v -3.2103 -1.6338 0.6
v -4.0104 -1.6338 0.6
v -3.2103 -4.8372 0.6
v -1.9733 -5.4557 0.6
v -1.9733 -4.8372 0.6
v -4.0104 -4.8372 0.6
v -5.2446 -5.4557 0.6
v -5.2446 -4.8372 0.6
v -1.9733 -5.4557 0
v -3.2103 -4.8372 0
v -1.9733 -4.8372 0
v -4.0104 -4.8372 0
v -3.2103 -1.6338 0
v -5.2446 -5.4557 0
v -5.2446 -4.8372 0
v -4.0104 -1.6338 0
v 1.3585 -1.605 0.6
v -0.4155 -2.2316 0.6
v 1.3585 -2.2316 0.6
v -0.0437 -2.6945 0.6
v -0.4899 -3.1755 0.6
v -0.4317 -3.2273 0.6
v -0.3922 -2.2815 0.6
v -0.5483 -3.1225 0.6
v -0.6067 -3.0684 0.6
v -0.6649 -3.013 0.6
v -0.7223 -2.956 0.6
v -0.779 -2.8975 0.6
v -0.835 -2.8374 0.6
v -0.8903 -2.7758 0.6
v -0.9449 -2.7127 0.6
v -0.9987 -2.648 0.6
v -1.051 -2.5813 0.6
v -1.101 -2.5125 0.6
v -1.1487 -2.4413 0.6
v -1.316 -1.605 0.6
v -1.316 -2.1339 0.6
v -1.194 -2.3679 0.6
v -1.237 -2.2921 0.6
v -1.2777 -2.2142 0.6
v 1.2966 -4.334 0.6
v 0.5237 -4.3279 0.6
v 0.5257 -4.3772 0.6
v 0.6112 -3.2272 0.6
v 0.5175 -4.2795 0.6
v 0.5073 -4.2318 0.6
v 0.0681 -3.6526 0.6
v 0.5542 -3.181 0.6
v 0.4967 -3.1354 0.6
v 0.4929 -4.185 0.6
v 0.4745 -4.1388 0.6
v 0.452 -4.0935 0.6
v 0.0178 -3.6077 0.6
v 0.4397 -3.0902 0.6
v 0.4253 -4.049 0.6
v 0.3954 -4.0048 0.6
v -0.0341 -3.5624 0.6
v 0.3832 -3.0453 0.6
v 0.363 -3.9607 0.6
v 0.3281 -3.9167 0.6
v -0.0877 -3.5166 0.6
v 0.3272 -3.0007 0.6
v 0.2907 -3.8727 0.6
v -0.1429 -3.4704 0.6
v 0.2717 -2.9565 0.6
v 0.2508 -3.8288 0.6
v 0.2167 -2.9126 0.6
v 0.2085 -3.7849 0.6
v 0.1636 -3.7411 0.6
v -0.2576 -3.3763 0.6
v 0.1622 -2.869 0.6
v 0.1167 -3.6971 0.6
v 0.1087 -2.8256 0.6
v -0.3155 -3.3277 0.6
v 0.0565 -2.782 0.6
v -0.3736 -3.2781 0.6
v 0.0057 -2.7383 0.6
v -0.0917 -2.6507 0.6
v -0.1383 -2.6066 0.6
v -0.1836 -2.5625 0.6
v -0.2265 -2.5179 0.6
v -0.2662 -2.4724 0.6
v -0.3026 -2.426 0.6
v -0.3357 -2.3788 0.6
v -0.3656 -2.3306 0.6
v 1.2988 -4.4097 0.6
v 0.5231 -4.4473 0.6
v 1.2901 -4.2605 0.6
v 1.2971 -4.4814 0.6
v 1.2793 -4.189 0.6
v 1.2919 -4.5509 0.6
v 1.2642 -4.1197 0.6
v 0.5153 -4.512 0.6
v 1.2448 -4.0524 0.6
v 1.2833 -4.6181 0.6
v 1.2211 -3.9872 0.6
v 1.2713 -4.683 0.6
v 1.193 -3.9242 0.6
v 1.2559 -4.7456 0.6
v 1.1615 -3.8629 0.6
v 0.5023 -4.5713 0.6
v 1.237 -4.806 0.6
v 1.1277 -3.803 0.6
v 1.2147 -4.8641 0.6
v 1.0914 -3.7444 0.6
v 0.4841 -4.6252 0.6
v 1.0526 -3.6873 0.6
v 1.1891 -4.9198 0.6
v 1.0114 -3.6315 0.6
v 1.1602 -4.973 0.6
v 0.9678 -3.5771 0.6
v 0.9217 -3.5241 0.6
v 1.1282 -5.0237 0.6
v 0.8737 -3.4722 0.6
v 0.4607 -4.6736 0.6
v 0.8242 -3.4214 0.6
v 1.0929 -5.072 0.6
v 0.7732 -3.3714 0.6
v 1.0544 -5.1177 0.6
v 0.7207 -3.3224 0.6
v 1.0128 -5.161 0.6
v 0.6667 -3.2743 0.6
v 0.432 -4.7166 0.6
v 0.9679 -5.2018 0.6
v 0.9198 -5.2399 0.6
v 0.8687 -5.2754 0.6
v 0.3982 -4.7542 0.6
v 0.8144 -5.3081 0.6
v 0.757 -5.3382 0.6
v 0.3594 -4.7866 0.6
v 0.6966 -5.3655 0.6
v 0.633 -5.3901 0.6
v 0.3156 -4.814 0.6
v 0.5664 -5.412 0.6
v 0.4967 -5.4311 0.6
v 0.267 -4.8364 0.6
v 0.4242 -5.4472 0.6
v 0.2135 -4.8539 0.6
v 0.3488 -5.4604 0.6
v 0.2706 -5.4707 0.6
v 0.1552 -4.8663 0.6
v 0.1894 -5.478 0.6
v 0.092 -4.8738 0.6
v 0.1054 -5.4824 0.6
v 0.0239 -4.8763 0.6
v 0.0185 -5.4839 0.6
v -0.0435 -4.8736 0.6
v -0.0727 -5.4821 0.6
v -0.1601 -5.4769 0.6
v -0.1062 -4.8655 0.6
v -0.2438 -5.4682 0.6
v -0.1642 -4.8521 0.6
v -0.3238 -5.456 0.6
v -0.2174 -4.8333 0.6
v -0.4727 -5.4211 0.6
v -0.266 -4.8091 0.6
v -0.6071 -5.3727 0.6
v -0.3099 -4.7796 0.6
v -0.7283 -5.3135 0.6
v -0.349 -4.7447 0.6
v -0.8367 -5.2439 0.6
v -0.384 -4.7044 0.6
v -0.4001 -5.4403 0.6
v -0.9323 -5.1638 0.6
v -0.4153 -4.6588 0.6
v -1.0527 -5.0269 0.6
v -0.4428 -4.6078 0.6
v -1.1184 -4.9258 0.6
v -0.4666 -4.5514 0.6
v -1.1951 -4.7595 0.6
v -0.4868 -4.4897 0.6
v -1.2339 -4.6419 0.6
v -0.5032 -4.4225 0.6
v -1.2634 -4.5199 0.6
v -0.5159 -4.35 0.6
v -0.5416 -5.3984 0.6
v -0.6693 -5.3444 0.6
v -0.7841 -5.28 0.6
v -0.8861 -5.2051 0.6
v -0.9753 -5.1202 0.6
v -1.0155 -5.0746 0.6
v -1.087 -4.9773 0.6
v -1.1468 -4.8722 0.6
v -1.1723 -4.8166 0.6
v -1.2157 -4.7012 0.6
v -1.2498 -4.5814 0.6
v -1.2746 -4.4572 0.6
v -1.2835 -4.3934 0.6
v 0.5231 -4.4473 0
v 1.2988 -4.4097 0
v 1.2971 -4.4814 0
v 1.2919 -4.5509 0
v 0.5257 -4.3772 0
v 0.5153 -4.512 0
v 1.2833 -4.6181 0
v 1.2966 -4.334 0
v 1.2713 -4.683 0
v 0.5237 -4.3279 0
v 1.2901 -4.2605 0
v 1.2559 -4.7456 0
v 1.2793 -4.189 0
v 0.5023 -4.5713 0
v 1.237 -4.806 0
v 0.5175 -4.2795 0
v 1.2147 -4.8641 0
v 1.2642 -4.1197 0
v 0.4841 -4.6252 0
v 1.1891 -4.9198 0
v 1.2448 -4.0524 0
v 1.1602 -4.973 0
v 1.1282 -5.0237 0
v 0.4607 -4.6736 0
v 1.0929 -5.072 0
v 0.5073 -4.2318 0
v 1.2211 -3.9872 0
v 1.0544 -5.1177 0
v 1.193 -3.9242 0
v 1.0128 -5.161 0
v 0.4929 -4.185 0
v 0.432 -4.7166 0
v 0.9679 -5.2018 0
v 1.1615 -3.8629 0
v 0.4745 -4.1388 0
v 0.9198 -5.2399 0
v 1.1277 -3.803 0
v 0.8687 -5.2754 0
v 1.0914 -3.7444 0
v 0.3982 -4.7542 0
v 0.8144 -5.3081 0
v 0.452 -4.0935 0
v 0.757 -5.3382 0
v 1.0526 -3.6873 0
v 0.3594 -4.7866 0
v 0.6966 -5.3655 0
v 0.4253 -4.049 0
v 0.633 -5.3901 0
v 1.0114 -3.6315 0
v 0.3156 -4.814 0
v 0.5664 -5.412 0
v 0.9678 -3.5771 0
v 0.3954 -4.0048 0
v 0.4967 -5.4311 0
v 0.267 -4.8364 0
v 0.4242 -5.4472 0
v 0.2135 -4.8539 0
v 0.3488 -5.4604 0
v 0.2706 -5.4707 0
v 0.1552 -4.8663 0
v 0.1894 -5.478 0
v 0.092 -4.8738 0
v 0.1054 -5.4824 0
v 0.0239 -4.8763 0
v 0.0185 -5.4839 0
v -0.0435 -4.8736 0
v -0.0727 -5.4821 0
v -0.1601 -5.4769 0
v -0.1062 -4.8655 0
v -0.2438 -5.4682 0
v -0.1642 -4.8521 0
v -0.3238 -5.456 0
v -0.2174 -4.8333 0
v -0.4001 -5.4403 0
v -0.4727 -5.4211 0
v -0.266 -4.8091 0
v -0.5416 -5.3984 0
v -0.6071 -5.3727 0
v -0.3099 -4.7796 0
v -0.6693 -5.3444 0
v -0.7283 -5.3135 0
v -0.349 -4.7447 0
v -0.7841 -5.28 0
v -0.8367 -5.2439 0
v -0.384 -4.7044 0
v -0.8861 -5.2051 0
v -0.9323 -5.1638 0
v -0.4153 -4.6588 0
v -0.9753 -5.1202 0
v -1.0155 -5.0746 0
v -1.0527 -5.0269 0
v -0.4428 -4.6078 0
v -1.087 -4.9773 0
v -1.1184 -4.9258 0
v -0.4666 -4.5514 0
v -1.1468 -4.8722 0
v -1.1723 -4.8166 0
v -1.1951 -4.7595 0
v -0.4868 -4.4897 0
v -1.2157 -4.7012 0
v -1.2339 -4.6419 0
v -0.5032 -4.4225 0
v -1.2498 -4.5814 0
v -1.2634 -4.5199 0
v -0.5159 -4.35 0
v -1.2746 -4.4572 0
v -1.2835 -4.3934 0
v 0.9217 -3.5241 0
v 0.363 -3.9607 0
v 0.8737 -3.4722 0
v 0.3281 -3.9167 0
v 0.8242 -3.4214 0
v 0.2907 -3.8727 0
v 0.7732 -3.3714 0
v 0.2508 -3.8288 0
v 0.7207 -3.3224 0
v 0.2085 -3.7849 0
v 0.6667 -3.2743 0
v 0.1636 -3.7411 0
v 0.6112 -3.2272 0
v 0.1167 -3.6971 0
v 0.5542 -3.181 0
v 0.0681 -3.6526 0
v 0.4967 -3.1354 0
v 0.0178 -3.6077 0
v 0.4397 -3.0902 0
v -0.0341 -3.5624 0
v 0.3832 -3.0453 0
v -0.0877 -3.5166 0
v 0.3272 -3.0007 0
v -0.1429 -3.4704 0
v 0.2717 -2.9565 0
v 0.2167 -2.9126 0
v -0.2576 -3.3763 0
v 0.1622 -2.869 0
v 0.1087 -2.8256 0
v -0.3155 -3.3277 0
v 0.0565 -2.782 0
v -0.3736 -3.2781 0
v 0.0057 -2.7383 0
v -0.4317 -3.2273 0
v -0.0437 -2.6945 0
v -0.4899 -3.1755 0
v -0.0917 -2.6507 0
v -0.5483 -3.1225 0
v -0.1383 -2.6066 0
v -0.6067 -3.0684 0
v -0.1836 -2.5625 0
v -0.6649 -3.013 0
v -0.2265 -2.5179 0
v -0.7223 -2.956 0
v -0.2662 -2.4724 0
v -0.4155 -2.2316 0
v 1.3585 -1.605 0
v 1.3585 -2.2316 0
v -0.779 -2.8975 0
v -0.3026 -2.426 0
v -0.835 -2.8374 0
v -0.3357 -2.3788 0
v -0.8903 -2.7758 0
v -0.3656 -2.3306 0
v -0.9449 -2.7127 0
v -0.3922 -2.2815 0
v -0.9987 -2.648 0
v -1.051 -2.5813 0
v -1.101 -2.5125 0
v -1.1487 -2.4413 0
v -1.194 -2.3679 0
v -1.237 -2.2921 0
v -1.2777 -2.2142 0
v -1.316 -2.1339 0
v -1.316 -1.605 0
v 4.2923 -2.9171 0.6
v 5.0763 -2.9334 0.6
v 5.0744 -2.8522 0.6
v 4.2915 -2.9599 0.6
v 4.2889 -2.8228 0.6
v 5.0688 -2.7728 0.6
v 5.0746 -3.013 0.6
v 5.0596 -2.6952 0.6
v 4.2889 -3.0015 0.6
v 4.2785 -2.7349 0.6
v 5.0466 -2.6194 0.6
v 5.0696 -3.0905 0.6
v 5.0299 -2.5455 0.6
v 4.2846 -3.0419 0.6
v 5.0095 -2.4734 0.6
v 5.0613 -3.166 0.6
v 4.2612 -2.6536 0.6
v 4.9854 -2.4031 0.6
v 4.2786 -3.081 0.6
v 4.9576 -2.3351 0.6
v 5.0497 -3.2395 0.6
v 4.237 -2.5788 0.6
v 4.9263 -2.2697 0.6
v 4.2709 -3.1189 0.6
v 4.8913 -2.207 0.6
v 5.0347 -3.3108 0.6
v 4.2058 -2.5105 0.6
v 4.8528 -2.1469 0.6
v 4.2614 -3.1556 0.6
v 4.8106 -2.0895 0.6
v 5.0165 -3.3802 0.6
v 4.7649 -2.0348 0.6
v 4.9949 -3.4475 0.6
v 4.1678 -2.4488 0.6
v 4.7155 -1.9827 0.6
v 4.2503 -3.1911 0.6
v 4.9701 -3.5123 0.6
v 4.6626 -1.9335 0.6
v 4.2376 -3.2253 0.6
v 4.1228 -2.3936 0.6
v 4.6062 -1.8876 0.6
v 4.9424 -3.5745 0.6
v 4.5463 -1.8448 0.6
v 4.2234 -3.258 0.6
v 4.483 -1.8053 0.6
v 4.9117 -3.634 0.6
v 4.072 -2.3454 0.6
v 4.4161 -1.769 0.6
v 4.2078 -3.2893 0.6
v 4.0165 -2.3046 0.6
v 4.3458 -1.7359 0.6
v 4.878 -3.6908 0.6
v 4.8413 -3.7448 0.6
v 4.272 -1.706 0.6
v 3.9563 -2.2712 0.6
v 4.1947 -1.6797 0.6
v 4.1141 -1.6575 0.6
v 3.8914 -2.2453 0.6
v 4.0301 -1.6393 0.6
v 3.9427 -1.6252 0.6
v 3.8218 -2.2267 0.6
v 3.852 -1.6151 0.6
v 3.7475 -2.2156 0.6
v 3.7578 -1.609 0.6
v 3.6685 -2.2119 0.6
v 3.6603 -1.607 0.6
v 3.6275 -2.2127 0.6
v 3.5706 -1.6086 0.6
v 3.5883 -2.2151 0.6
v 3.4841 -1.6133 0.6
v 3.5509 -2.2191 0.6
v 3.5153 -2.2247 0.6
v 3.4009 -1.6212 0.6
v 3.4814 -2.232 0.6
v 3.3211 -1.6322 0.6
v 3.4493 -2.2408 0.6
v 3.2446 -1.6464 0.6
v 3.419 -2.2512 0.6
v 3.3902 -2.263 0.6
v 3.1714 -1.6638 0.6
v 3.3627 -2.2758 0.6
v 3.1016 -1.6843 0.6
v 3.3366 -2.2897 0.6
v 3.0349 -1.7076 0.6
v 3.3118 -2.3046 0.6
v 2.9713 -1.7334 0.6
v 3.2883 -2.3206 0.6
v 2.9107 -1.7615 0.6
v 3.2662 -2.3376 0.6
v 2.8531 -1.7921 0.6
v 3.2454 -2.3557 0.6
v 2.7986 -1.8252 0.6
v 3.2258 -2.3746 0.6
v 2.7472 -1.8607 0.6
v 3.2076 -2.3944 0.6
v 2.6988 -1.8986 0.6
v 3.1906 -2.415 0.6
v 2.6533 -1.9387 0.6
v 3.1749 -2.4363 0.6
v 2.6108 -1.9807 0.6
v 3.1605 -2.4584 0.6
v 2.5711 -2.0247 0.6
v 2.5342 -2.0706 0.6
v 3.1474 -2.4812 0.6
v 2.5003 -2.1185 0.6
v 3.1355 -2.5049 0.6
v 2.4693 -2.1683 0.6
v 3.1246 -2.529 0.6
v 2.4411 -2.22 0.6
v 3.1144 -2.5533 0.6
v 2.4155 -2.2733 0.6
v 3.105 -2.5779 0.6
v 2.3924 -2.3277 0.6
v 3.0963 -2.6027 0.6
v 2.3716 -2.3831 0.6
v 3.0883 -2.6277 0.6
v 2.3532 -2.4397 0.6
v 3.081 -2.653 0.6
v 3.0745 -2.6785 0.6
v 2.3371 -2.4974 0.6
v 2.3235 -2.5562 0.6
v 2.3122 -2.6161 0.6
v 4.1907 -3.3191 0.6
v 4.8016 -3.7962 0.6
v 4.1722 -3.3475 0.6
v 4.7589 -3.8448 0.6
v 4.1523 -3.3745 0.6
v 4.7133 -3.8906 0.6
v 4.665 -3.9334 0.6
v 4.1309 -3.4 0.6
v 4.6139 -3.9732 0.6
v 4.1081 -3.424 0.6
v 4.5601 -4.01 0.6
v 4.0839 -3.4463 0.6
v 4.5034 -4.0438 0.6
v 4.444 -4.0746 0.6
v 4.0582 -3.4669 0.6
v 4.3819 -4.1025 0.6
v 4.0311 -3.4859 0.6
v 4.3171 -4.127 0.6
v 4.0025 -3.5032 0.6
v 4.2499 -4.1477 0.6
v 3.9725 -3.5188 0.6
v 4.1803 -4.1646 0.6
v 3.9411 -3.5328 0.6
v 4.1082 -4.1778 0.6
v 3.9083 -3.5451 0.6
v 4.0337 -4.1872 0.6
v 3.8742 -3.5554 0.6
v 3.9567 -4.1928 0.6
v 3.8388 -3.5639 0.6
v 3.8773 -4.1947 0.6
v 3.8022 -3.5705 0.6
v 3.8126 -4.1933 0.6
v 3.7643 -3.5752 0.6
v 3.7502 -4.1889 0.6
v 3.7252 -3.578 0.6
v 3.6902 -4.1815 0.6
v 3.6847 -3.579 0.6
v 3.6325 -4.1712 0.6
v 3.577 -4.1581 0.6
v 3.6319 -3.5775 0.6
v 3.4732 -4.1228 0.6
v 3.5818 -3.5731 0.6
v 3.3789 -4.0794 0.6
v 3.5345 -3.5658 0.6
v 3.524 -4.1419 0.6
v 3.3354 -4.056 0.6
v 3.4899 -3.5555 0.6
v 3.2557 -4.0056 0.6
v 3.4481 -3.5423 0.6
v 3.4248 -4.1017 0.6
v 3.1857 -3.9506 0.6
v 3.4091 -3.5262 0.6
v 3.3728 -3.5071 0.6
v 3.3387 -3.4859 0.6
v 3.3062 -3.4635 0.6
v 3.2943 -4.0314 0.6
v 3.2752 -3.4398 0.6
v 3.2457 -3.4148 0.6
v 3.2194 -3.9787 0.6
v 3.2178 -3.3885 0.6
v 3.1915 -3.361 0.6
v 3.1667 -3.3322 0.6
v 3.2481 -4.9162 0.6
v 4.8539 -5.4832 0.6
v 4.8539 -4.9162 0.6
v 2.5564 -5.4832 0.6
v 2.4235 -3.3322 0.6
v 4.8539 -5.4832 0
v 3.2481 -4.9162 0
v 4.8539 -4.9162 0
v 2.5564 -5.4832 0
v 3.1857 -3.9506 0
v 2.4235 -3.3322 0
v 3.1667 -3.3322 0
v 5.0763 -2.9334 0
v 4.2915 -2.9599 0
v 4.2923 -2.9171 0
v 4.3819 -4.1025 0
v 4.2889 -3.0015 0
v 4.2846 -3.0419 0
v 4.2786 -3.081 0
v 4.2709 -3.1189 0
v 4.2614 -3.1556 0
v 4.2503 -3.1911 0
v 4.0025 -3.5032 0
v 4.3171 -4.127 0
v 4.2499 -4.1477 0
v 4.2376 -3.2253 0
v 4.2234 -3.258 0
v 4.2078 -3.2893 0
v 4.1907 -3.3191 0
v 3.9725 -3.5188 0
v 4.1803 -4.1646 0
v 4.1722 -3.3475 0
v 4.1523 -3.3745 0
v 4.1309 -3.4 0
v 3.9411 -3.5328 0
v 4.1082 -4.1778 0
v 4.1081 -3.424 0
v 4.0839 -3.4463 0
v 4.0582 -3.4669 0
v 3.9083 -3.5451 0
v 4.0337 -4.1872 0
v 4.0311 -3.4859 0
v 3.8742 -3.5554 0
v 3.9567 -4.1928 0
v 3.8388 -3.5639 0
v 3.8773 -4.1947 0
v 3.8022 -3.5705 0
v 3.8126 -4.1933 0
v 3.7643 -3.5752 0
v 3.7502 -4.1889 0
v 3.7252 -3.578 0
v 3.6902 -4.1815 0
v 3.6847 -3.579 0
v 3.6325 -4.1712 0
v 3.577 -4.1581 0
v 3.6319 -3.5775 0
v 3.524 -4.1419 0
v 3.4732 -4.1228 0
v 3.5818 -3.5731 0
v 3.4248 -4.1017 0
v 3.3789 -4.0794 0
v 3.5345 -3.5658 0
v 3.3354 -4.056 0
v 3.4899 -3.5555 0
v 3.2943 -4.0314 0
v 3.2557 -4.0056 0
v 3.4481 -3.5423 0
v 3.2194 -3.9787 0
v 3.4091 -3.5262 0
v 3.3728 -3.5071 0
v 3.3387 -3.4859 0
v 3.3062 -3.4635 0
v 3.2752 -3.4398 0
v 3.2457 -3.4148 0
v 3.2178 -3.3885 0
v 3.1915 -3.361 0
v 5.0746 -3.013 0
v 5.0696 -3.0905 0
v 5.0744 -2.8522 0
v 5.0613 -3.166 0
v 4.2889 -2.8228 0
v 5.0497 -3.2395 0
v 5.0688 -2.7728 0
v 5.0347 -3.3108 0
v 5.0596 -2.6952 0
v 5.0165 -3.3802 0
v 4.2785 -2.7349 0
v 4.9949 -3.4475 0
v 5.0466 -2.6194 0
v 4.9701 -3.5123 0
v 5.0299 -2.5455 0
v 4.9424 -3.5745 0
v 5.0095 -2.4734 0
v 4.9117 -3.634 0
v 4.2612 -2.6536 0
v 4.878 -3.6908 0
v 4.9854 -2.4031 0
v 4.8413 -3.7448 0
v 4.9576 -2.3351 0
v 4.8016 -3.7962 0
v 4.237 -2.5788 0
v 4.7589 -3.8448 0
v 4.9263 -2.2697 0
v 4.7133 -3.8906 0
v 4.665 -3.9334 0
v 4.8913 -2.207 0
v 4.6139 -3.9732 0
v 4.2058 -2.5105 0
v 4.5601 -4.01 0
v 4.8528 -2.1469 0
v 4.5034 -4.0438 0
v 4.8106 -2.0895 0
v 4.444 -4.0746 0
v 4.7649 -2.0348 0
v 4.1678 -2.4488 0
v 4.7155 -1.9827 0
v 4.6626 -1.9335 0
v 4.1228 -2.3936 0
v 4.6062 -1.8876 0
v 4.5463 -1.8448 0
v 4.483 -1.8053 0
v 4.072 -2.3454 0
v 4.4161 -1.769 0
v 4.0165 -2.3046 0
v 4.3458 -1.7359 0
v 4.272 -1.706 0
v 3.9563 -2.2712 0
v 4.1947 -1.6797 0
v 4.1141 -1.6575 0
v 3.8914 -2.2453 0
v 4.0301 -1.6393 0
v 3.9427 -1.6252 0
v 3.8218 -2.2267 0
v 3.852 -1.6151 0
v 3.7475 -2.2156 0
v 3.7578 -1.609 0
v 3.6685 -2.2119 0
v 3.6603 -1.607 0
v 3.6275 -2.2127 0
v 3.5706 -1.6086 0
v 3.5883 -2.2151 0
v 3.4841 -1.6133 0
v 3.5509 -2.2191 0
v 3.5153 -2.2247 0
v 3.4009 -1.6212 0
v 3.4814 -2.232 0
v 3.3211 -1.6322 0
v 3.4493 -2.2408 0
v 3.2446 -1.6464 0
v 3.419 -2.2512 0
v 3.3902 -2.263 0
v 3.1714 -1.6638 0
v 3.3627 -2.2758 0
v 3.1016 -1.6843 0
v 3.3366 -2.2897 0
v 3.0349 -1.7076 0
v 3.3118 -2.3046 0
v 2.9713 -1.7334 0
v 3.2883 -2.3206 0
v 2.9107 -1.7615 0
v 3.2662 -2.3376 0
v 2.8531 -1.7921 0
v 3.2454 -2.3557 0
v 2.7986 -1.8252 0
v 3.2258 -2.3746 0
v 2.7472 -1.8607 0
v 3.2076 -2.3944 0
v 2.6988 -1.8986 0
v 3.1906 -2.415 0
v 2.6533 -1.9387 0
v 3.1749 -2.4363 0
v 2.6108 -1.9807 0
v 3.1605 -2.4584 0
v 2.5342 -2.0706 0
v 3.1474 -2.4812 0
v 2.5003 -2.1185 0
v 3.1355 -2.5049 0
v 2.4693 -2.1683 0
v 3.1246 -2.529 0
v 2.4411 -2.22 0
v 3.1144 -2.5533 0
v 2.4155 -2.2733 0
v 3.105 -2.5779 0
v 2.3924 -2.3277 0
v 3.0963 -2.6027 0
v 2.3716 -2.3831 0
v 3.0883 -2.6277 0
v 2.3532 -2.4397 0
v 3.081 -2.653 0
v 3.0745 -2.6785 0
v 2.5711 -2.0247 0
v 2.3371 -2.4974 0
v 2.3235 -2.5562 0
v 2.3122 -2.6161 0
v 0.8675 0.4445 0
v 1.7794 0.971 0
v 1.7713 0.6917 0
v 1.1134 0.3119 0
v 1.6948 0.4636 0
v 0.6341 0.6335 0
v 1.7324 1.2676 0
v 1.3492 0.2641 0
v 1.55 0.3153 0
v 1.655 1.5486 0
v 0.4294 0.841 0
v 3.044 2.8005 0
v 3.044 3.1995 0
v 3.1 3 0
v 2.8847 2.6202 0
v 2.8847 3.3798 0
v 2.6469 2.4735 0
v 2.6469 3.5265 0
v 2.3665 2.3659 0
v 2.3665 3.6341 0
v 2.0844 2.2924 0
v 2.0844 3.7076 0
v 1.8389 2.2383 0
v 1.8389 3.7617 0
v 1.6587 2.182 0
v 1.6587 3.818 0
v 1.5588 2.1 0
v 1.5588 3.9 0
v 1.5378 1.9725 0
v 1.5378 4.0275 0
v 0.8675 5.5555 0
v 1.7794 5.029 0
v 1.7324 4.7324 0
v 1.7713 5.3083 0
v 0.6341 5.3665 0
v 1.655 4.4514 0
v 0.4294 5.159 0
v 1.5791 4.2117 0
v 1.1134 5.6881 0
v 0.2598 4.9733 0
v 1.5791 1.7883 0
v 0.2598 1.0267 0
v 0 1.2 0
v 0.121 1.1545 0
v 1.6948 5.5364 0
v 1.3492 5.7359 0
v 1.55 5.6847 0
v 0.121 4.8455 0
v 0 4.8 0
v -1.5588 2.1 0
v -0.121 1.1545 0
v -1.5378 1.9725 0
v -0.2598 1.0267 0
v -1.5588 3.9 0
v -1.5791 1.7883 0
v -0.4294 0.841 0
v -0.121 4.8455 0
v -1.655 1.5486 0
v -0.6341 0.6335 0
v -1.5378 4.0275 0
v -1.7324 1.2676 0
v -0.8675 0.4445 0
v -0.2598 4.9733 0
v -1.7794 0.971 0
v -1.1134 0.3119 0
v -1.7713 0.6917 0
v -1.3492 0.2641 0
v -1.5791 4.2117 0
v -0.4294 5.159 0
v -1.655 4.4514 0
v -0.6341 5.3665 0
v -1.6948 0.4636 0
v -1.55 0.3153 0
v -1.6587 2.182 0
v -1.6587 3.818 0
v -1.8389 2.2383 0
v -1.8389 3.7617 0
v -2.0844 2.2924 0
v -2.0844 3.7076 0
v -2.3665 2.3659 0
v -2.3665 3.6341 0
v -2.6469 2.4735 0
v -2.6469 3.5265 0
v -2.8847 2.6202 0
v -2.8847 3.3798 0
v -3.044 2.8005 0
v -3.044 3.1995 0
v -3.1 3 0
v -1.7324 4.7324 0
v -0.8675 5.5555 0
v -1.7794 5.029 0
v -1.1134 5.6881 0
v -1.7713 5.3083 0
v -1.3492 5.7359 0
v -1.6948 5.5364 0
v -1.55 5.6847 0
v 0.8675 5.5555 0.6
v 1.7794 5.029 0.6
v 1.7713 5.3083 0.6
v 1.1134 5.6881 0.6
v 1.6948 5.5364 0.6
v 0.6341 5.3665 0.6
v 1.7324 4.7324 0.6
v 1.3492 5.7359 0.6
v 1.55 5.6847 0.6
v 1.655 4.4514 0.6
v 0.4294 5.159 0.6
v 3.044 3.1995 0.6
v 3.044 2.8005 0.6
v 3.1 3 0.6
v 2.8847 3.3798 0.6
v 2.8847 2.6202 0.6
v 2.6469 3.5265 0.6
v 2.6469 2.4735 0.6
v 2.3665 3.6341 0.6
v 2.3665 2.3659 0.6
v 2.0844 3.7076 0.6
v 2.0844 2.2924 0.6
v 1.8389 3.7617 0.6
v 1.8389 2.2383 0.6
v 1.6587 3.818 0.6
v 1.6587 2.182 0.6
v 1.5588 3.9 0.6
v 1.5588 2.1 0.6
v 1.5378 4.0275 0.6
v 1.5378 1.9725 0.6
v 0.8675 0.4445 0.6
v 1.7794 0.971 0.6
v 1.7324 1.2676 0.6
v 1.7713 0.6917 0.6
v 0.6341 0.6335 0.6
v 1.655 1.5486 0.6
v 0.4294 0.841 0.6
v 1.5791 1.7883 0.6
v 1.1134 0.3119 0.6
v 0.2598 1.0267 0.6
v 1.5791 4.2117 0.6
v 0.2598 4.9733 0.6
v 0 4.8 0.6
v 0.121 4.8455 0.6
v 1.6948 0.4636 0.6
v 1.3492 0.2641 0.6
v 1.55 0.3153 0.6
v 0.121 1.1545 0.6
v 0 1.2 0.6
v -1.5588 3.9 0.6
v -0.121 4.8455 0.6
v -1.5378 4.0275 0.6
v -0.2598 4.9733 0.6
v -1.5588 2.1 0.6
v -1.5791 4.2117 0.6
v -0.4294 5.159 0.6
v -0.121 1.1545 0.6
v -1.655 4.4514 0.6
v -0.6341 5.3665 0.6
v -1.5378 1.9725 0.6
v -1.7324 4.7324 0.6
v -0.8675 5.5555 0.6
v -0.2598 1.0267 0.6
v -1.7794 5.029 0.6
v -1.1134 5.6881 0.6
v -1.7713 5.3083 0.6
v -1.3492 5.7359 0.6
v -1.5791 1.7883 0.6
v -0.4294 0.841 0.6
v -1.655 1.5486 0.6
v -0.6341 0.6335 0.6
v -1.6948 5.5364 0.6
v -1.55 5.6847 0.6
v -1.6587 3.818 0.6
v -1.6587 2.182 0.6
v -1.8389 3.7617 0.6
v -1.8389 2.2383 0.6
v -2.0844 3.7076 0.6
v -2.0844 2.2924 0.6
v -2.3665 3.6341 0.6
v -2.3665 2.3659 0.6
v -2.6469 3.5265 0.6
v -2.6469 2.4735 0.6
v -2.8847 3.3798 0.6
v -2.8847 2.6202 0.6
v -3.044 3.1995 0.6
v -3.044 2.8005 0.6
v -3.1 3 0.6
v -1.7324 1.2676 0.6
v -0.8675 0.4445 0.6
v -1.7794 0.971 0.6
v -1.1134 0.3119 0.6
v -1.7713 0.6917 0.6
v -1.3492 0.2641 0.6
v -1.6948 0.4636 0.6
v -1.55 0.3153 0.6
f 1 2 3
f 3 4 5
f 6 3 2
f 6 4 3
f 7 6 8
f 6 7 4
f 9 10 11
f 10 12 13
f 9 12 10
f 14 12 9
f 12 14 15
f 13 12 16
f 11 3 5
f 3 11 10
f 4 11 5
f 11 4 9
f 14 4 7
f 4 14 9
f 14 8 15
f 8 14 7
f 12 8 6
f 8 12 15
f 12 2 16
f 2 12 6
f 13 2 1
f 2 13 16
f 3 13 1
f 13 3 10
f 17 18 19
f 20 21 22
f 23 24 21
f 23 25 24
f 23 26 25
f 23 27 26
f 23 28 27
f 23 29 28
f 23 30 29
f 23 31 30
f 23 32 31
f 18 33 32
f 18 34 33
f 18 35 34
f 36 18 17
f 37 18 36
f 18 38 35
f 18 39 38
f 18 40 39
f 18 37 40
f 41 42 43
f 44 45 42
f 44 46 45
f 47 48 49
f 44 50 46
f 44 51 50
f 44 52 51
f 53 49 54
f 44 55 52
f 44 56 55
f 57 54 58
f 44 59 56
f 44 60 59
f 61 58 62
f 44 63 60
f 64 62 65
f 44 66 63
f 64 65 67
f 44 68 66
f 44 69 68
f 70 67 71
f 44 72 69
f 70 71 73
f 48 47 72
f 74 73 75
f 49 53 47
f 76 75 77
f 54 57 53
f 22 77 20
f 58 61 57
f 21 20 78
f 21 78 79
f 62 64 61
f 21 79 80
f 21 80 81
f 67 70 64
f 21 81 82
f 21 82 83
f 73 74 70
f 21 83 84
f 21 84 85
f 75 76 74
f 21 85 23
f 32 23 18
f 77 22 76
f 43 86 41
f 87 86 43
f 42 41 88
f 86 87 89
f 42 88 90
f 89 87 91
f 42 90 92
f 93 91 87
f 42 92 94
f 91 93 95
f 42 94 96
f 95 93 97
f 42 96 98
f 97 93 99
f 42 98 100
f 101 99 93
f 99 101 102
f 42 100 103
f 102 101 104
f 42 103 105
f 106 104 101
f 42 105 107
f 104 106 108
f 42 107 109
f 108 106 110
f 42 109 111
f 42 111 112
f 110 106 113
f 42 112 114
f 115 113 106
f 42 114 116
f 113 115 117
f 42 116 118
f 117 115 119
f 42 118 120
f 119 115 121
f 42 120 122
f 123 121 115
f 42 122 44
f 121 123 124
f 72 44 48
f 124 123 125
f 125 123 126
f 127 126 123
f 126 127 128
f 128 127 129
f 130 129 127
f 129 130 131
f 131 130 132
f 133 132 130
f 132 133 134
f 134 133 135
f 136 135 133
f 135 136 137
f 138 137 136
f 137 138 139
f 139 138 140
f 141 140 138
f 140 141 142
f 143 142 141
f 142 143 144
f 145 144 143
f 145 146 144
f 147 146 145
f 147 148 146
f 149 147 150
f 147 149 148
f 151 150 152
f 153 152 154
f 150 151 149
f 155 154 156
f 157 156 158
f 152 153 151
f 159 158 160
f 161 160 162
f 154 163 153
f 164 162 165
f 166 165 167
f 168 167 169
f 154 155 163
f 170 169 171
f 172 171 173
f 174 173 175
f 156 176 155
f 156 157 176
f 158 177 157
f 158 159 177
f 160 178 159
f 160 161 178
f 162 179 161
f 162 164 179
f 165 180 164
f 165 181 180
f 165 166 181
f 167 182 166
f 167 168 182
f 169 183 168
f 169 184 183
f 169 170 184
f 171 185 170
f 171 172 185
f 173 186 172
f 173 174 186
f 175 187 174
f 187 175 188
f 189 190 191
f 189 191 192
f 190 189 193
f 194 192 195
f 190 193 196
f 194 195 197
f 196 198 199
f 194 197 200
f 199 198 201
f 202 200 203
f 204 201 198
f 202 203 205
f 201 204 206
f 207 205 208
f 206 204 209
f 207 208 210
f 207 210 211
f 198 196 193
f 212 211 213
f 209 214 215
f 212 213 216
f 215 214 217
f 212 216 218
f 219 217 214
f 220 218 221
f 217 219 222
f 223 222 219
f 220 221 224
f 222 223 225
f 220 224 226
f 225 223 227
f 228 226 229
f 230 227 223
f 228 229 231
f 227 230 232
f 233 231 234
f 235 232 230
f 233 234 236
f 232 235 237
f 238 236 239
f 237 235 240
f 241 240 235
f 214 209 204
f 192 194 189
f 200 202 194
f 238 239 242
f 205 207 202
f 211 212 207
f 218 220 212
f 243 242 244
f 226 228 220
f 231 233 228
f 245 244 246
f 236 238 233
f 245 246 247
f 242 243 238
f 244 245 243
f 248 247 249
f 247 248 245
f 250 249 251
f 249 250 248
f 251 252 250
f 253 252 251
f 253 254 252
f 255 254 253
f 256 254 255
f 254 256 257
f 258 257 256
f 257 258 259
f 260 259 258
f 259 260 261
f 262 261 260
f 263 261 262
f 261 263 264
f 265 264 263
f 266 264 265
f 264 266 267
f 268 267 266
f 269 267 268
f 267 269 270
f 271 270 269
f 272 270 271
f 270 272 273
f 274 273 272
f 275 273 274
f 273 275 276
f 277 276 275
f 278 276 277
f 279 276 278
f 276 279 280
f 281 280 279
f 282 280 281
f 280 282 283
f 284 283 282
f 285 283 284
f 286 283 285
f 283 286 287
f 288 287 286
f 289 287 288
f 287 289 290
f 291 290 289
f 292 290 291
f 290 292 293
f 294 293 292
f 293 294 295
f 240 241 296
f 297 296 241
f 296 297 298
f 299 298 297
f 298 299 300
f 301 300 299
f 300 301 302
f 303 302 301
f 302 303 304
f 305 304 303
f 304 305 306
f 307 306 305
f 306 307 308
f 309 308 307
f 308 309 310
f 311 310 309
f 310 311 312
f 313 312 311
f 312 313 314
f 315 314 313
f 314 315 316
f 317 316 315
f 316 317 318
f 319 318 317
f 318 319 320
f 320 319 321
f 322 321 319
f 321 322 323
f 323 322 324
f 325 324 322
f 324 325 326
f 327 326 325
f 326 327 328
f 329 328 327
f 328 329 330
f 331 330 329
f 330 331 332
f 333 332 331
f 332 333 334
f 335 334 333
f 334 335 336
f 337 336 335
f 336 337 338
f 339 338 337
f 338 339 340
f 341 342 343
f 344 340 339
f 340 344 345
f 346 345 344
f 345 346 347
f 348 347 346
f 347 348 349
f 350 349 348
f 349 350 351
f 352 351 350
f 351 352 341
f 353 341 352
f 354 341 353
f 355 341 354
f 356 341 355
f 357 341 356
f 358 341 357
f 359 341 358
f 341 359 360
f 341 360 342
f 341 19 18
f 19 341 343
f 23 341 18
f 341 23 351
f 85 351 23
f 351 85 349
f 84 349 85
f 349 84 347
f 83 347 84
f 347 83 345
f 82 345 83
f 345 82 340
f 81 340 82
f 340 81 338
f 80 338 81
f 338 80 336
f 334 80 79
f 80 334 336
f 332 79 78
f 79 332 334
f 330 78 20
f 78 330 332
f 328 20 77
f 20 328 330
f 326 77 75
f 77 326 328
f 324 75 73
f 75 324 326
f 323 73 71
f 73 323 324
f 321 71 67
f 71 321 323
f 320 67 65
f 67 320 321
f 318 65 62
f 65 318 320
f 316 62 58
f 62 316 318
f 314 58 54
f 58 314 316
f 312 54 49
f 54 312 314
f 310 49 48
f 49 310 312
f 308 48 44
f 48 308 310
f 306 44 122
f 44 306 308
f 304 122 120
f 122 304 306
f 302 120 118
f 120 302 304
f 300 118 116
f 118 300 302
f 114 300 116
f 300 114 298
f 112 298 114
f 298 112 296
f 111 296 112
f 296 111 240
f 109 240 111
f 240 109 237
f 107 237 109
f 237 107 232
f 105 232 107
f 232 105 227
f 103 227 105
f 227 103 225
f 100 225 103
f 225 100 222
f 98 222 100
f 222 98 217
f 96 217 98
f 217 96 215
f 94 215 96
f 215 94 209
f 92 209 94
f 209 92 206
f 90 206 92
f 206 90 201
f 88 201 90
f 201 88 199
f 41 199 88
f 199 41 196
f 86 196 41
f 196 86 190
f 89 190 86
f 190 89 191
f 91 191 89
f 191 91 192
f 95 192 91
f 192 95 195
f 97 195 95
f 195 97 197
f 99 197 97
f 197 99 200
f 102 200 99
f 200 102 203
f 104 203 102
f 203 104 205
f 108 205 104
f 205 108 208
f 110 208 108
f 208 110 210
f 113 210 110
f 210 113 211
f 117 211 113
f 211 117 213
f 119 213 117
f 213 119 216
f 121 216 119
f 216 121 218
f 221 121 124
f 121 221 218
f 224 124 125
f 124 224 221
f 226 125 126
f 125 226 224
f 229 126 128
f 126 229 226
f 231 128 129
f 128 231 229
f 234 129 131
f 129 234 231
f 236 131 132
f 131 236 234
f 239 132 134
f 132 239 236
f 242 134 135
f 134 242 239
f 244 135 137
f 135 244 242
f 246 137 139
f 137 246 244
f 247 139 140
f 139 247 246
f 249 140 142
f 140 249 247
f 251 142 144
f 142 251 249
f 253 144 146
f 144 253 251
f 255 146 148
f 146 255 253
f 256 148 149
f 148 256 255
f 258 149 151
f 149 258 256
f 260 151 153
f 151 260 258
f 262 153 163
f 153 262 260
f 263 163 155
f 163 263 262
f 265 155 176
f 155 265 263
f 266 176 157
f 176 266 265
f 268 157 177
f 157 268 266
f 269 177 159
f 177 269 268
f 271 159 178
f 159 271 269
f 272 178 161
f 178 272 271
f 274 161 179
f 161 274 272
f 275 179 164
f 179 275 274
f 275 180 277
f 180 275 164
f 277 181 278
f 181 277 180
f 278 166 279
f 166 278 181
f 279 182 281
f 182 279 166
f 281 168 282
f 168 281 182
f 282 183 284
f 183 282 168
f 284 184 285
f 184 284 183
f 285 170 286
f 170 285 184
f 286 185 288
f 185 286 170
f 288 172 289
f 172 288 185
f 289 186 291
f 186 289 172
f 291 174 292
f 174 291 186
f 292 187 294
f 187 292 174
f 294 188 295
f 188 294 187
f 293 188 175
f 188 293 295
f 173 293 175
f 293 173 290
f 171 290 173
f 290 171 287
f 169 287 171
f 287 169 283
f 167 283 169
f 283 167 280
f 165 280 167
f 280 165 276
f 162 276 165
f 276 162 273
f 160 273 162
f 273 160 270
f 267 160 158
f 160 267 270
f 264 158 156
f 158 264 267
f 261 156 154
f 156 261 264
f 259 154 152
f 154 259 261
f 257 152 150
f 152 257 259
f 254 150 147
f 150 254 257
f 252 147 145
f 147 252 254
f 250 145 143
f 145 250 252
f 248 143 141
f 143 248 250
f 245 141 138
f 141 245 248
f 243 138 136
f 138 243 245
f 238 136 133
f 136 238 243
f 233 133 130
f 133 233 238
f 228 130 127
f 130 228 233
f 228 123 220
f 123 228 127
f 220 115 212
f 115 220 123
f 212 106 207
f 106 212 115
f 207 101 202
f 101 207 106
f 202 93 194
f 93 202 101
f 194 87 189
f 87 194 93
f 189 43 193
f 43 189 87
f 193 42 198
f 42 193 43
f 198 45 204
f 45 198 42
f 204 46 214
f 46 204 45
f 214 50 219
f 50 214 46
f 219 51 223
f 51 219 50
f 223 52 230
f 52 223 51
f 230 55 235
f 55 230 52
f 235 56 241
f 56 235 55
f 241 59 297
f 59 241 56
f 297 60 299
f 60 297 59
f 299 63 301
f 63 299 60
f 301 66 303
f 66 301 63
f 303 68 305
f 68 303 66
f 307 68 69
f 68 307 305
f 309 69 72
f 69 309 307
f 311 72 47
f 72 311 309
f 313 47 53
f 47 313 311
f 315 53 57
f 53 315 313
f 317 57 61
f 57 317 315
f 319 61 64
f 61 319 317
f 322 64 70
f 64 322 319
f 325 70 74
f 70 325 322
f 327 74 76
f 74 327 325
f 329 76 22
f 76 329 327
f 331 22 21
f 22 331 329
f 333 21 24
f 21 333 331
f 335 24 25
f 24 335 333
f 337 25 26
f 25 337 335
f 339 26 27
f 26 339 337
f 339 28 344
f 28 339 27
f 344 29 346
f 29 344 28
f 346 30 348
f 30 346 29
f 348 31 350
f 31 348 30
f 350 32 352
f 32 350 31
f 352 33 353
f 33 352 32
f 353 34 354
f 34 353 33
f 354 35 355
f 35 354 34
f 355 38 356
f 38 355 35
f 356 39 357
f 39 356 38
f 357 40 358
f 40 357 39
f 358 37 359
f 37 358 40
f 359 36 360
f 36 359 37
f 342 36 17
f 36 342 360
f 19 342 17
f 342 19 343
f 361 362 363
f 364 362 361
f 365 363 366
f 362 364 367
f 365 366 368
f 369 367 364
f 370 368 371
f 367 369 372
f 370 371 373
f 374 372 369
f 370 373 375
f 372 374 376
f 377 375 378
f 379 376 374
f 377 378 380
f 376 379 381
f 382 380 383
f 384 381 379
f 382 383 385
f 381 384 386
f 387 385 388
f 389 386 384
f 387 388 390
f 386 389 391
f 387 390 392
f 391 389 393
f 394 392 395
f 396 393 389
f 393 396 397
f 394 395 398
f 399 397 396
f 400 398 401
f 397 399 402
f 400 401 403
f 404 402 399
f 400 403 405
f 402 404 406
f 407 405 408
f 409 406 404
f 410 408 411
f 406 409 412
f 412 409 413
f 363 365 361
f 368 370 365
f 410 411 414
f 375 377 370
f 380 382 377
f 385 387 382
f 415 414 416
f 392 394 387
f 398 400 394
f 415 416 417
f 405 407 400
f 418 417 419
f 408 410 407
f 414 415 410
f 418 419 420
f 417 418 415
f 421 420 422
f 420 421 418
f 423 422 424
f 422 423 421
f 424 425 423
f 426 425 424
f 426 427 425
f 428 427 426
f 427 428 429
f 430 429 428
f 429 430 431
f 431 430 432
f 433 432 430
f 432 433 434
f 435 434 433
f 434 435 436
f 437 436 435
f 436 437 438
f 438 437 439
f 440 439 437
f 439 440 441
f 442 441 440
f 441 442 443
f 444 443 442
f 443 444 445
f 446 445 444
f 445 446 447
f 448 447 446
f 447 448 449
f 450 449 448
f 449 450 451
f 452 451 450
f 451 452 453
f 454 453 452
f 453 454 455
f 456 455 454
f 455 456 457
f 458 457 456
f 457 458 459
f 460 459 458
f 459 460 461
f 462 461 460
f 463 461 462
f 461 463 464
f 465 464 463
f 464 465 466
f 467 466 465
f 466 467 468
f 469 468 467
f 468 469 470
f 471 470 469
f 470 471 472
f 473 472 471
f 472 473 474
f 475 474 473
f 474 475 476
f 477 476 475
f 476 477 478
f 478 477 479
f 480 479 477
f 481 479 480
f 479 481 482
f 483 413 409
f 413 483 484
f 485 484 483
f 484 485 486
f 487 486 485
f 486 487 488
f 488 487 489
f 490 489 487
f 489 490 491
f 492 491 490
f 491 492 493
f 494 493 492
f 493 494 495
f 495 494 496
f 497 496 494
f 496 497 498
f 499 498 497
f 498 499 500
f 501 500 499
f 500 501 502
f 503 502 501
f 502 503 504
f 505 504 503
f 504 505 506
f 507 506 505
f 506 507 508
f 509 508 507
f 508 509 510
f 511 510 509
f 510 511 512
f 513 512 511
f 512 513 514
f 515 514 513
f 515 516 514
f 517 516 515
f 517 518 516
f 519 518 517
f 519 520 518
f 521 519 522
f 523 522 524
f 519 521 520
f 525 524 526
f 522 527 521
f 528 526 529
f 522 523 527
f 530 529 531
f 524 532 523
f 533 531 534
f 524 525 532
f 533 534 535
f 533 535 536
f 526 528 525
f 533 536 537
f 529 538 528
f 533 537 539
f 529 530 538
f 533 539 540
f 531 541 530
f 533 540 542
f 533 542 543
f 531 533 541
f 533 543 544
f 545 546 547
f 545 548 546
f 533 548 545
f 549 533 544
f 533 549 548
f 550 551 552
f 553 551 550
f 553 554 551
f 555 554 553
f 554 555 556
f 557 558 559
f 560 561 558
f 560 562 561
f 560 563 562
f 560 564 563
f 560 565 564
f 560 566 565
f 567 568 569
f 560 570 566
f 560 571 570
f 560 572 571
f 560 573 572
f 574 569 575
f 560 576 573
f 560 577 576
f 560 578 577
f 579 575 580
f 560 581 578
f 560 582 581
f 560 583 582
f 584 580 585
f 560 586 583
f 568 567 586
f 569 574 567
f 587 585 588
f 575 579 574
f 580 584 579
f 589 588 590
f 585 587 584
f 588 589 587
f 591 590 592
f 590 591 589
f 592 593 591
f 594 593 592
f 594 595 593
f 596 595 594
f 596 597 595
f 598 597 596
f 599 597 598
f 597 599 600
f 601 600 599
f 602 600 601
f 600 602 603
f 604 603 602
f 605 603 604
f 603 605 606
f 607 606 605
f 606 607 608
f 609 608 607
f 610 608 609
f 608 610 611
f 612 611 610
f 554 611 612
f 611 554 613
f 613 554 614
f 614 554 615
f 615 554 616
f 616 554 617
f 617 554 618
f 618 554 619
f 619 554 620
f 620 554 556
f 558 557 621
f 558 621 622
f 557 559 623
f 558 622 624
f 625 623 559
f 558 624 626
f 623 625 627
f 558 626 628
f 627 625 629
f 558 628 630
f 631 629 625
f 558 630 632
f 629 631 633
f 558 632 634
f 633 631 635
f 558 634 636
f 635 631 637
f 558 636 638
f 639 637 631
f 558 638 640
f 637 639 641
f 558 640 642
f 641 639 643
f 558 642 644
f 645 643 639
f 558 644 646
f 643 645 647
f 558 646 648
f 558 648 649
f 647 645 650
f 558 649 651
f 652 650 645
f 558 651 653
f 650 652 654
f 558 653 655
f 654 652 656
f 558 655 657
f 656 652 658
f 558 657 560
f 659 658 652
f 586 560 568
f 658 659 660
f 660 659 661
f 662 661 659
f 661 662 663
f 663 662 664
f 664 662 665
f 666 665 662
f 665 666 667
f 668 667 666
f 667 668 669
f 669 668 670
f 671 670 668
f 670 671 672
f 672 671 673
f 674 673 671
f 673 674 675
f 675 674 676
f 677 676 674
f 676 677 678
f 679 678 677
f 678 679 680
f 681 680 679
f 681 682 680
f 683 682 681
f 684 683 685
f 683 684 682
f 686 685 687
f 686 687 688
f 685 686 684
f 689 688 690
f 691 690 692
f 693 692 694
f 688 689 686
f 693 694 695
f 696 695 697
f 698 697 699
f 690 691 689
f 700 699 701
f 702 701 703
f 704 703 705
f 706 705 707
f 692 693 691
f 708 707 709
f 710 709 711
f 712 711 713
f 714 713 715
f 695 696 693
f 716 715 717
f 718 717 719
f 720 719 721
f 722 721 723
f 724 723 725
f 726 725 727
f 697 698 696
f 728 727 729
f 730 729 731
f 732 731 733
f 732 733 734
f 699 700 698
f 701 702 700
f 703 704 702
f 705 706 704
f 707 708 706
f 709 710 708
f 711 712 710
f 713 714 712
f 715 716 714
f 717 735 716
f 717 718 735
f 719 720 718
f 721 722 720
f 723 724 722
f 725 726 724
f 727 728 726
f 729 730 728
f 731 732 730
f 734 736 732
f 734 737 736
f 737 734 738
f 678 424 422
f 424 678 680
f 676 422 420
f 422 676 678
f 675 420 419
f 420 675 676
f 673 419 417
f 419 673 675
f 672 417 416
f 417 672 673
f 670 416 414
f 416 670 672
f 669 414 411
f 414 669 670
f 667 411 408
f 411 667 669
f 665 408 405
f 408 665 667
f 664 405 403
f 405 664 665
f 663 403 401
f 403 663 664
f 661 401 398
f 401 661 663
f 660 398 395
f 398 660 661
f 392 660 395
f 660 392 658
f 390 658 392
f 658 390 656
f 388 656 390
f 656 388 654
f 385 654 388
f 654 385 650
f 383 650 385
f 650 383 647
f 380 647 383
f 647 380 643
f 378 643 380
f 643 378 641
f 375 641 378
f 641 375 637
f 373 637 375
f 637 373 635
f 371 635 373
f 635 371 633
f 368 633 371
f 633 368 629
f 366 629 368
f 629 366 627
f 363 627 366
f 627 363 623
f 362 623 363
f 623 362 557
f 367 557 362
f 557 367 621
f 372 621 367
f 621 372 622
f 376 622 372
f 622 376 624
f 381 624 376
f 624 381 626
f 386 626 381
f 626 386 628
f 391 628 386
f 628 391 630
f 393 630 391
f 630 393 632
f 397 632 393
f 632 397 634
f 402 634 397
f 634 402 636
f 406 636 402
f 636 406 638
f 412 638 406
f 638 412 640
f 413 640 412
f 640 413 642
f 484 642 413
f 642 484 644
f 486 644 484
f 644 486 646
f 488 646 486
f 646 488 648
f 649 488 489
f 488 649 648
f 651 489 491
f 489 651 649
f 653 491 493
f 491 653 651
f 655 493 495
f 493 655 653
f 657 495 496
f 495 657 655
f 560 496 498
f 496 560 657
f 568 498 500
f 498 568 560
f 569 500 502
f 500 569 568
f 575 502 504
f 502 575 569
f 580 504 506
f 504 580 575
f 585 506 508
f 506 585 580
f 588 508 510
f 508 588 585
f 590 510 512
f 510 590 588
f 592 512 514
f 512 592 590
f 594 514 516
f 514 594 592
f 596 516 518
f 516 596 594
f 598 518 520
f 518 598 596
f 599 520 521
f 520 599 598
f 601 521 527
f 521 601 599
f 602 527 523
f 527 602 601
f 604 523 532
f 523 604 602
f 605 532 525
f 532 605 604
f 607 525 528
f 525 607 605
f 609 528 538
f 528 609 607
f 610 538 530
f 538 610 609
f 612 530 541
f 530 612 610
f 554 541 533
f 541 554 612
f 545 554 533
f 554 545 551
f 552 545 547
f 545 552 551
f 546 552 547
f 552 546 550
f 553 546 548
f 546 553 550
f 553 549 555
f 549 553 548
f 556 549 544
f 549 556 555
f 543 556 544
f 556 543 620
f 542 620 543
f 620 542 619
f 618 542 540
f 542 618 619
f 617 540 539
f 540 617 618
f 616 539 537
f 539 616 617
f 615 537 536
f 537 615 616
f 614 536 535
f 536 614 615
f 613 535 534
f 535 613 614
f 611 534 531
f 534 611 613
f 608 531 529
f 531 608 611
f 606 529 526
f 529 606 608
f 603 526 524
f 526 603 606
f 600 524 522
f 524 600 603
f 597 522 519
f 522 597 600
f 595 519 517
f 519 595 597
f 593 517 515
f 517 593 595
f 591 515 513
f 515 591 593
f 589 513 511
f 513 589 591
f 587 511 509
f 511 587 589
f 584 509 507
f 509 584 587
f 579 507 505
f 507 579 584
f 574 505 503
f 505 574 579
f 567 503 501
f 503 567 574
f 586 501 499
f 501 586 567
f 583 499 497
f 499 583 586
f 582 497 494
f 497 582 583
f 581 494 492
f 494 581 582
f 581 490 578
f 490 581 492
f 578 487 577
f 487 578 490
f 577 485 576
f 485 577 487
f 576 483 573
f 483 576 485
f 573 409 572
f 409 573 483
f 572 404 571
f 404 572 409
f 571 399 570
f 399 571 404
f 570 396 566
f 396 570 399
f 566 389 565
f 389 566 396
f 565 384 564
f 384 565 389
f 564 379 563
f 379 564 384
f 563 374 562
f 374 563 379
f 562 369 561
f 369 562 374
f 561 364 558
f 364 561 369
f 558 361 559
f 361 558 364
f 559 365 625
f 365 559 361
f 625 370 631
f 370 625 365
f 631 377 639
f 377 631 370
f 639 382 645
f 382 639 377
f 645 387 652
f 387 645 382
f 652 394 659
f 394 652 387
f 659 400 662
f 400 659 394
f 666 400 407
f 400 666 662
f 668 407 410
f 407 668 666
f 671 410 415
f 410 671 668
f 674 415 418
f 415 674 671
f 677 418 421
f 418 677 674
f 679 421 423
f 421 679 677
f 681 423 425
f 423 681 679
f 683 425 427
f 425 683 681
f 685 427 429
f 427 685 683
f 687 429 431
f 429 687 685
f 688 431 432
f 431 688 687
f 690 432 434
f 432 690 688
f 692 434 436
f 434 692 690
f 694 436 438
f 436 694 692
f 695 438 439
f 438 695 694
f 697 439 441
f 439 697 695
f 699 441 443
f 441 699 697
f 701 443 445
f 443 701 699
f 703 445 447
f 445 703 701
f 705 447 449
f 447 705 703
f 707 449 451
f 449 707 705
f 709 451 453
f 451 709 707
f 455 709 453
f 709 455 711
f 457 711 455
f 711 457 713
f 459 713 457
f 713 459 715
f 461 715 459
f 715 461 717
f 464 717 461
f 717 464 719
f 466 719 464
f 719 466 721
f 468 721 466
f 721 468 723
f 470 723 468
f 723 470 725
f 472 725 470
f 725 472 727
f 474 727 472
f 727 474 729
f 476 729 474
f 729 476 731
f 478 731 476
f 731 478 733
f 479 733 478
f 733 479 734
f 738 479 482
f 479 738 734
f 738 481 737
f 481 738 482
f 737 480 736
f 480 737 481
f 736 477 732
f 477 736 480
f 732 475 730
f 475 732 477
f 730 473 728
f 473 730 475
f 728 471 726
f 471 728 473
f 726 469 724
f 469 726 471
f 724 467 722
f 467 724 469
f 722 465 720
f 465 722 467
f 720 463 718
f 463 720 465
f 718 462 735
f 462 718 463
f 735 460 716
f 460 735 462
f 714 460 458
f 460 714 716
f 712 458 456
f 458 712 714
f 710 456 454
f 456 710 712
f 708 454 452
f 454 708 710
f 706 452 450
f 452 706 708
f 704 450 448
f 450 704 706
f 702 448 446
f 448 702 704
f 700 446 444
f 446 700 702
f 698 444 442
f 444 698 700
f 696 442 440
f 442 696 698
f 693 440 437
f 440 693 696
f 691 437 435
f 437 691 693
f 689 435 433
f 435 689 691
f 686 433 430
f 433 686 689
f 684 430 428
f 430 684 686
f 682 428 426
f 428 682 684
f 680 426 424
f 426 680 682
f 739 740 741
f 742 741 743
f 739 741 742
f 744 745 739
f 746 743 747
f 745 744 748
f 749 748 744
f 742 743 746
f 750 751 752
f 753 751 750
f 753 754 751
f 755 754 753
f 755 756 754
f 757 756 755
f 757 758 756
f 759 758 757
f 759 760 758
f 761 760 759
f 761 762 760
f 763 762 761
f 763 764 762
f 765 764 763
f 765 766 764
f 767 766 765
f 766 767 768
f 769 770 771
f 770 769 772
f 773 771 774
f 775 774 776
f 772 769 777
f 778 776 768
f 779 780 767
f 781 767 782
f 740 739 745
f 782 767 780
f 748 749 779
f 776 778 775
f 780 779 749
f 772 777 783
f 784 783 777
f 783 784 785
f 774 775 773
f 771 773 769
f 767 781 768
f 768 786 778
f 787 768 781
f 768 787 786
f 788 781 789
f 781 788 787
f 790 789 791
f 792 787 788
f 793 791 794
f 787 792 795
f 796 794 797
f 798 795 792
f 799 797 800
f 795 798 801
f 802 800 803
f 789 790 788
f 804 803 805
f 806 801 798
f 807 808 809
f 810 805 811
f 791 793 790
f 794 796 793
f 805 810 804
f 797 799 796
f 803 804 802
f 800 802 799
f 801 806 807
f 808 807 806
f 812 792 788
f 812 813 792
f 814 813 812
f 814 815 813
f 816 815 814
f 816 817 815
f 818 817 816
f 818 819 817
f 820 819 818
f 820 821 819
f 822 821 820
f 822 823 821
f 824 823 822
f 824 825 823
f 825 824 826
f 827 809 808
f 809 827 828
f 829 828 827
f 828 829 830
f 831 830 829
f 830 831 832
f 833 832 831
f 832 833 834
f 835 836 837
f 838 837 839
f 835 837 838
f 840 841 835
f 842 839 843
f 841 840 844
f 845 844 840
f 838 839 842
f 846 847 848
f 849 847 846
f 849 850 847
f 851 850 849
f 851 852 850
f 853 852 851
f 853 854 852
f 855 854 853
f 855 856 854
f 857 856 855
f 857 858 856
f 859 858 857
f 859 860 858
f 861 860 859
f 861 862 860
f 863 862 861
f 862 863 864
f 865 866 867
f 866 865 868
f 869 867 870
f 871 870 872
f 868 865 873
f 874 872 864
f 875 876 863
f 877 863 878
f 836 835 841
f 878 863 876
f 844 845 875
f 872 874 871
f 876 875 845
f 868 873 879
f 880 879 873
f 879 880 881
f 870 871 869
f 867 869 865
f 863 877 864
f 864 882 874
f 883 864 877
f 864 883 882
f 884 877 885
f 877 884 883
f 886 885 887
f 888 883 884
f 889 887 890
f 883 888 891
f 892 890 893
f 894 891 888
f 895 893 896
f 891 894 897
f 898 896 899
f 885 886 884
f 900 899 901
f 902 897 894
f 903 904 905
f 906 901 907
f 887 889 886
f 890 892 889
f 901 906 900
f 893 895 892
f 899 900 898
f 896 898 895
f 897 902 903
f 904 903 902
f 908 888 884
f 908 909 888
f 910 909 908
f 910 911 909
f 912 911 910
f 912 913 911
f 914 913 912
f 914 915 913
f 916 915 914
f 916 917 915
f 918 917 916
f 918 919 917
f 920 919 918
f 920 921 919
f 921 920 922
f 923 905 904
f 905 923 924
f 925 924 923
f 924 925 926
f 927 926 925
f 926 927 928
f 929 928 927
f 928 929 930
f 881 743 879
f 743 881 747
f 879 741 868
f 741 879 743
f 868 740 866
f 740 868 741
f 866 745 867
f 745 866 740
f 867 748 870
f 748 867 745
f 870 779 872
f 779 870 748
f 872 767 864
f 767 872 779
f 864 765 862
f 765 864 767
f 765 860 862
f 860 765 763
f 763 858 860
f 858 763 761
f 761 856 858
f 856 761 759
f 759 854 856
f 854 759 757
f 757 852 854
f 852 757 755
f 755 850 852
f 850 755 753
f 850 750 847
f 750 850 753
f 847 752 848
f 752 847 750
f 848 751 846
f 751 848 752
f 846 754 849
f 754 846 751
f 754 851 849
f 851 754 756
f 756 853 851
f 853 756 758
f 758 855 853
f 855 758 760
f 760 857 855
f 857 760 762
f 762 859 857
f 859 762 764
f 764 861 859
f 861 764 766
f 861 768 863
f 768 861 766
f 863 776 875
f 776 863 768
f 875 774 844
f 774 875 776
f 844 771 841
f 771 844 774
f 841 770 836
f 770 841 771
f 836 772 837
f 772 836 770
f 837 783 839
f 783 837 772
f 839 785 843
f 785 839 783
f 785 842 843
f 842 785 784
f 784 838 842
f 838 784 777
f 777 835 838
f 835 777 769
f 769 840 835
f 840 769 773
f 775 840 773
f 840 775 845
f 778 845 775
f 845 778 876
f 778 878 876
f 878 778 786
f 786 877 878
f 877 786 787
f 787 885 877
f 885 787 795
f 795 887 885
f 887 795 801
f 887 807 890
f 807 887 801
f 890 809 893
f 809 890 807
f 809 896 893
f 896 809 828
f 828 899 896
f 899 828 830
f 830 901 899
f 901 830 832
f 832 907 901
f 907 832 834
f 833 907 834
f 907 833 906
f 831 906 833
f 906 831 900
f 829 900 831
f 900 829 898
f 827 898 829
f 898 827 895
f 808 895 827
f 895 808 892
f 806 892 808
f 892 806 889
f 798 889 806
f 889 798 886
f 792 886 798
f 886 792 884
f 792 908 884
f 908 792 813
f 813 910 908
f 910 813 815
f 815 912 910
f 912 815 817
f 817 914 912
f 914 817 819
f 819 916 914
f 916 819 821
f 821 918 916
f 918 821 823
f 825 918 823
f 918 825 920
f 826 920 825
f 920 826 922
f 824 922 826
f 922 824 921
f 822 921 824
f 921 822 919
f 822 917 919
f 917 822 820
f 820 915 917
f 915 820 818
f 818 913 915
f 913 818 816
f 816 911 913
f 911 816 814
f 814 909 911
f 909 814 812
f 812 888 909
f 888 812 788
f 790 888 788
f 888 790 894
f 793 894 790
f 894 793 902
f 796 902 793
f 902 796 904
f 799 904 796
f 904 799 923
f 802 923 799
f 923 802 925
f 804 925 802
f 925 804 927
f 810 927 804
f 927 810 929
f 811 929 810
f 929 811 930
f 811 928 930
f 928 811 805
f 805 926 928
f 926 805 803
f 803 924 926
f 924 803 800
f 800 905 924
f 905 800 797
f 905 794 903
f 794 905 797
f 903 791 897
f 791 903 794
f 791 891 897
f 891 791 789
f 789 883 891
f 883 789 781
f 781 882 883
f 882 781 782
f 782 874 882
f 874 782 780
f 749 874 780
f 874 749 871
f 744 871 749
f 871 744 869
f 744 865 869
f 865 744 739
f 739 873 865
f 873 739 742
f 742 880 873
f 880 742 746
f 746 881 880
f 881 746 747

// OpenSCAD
$fn = 50;

difference() {
	union() {
		translate(v = [-3.65, -3.5, 0.6]) {
			rotate(a = [180, 0, 0]) {
				linear_extrude(height = 0.6) {
					text(font = "Liberation Sans:style=Bold", halign = "center", size = 4.0, text = "T", valign = "center");
				}
			}
		}
		translate(v = [0.0, -3.5, 0.6]) {
			rotate(a = [180, 0, 0]) {
				linear_extrude(height = 0.6) {
					text(font = "Liberation Sans:style=Bold", halign = "center", size = 4.0, text = "2", valign = "center");
				}
			}
		}
		translate(v = [3.65, -3.5, 0.6]) {
			rotate(a = [180, 0, 0]) {
				linear_extrude(height = 0.6) {
					text(font = "Liberation Sans:style=Bold", halign = "center", size = 4.0, text = "5", valign = "center");
				}
			}
		}
		translate(v = [0, 3, 0]) {
			linear_extrude(height = 0.6) {
				polygon(points = [[3.1, 0.0], [3.0439902950186117, 0.1995136647114984], [2.8847272103883213, 0.3797815421059436], [2.646888617374527, 0.5264988810722369], [2.3665182744082176, 0.6341066605011758], [2.0844354103556904, 0.7075704773708675], [1.8388718910678303, 0.761685676746956], [1.658746676795018, 0.818003336606089], [1.55884572681199, 0.9], [1.5377850082788151, 1.0275150922444565], [1.5790750912955211, 1.211666933596394], [1.6549917135488983, 1.4513887792304347], [1.7324116139070416, 1.7324116139070416], [1.779405714759903, 2.0290233430980913], [1.7712640685463372, 2.3083562761315313], [1.6947790495515949, 2.5364160920036563], [1.5500000000000005, 2.68467875173176], [1.3492112454670173, 2.735929756715155], [1.1134631418419842, 2.688137818237475], [0.8674829026146248, 2.555522224170328], [0.6341066605011758, 2.3665182744082176], [0.42944369680679173, 2.1589592566013023], [0.2597967997723095, 1.9733526103433505], [0.120961668516203, 1.8455184288505457], [1.102182119232618e-16, 1.8000000000000003], [-0.12096166851620277, 1.8455184288505457], [-0.25979679977230924, 1.9733526103433503], [-0.42944369680679134, 2.158959256601302], [-0.6341066605011755, 2.366518274408217], [-0.8674829026146244, 2.555522224170328], [-1.1134631418419831, 2.688137818237475], [-1.3492112454670169, 2.735929756715155], [-1.5499999999999994, 2.68467875173176], [-1.6947790495515944, 2.536416092003656], [-1.7712640685463372, 2.3083562761315313], [-1.7794057147599032, 2.0290233430980913], [-1.7324116139070418, 1.732411613907042], [-1.6549917135488983, 1.4513887792304352], [-1.5790750912955214, 1.211666933596395], [-1.5377850082788156, 1.0275150922444576], [-1.55884572681199, 0.9], [-1.6587466767950174, 0.8180033366060897], [-1.8388718910678303, 0.7616856767469562], [-2.084435410355689, 0.7075704773708675], [-2.3665182744082154, 0.634106660501176], [-2.646888617374527, 0.5264988810722366], [-2.8847272103883204, 0.37978154210594467], [-3.0439902950186117, 0.1995136647114986], [-3.1, 3.796405077356795e-16], [-3.043990295018612, -0.19951366471149784], [-2.8847272103883213, -0.37978154210594417], [-2.646888617374528, -0.5264988810722362], [-2.366518274408217, -0.6341066605011759], [-2.0844354103556904, -0.7075704773708673], [-1.8388718910678312, -0.7616856767469561], [-1.6587466767950179, -0.8180033366060894], [-1.5588457268119902, -0.8999999999999996], [-1.5377850082788154, -1.0275150922444558], [-1.5790750912955211, -1.211666933596394], [-1.6549917135488978, -1.4513887792304343], [-1.7324116139070413, -1.7324116139070393], [-1.7794057147599032, -2.0290233430980904], [-1.7712640685463374, -2.30835627613153], [-1.6947790495515942, -2.5364160920036567], [-1.5500000000000014, -2.6846787517317594], [-1.349211245467018, -2.7359297567151555], [-1.1134631418419827, -2.688137818237474], [-0.8674829026146252, -2.5555222241703284], [-0.6341066605011755, -2.366518274408217], [-0.42944369680679256, -2.1589592566013027], [-0.2597967997723094, -1.973352610343351], [-0.12096166851620195, -1.8455184288505448], [-3.3065463576978537e-16, -1.8000000000000003], [0.12096166851620122, -1.8455184288505442], [0.2597967997723086, -1.9733526103433503], [0.4294436968067915, -2.1589592566013014], [0.6341066605011743, -2.3665182744082163], [0.8674829026146239, -2.5555222241703275], [1.1134631418419814, -2.688137818237473], [1.3492112454670167, -2.735929756715155], [1.5500000000000005, -2.68467875173176], [1.6947790495515938, -2.536416092003658], [1.7712640685463361, -2.3083562761315344], [1.7794057147599027, -2.0290233430980895], [1.732411613907041, -1.7324116139070416], [1.6549917135488992, -1.451388779230435], [1.5790750912955214, -1.2116669335963952], [1.5377850082788151, -1.0275150922444585], [1.5588457268119893, -0.9000000000000009], [1.658746676795018, -0.8180033366060894], [1.8388718910678303, -0.7616856767469555], [2.084435410355689, -0.7075704773708676], [2.366518274408215, -0.6341066605011774], [2.646888617374524, -0.5264988810722376], [2.8847272103883217, -0.37978154210594395], [3.0439902950186117, -0.1995136647114976]]);
			}
		}
	}
	union();
}
